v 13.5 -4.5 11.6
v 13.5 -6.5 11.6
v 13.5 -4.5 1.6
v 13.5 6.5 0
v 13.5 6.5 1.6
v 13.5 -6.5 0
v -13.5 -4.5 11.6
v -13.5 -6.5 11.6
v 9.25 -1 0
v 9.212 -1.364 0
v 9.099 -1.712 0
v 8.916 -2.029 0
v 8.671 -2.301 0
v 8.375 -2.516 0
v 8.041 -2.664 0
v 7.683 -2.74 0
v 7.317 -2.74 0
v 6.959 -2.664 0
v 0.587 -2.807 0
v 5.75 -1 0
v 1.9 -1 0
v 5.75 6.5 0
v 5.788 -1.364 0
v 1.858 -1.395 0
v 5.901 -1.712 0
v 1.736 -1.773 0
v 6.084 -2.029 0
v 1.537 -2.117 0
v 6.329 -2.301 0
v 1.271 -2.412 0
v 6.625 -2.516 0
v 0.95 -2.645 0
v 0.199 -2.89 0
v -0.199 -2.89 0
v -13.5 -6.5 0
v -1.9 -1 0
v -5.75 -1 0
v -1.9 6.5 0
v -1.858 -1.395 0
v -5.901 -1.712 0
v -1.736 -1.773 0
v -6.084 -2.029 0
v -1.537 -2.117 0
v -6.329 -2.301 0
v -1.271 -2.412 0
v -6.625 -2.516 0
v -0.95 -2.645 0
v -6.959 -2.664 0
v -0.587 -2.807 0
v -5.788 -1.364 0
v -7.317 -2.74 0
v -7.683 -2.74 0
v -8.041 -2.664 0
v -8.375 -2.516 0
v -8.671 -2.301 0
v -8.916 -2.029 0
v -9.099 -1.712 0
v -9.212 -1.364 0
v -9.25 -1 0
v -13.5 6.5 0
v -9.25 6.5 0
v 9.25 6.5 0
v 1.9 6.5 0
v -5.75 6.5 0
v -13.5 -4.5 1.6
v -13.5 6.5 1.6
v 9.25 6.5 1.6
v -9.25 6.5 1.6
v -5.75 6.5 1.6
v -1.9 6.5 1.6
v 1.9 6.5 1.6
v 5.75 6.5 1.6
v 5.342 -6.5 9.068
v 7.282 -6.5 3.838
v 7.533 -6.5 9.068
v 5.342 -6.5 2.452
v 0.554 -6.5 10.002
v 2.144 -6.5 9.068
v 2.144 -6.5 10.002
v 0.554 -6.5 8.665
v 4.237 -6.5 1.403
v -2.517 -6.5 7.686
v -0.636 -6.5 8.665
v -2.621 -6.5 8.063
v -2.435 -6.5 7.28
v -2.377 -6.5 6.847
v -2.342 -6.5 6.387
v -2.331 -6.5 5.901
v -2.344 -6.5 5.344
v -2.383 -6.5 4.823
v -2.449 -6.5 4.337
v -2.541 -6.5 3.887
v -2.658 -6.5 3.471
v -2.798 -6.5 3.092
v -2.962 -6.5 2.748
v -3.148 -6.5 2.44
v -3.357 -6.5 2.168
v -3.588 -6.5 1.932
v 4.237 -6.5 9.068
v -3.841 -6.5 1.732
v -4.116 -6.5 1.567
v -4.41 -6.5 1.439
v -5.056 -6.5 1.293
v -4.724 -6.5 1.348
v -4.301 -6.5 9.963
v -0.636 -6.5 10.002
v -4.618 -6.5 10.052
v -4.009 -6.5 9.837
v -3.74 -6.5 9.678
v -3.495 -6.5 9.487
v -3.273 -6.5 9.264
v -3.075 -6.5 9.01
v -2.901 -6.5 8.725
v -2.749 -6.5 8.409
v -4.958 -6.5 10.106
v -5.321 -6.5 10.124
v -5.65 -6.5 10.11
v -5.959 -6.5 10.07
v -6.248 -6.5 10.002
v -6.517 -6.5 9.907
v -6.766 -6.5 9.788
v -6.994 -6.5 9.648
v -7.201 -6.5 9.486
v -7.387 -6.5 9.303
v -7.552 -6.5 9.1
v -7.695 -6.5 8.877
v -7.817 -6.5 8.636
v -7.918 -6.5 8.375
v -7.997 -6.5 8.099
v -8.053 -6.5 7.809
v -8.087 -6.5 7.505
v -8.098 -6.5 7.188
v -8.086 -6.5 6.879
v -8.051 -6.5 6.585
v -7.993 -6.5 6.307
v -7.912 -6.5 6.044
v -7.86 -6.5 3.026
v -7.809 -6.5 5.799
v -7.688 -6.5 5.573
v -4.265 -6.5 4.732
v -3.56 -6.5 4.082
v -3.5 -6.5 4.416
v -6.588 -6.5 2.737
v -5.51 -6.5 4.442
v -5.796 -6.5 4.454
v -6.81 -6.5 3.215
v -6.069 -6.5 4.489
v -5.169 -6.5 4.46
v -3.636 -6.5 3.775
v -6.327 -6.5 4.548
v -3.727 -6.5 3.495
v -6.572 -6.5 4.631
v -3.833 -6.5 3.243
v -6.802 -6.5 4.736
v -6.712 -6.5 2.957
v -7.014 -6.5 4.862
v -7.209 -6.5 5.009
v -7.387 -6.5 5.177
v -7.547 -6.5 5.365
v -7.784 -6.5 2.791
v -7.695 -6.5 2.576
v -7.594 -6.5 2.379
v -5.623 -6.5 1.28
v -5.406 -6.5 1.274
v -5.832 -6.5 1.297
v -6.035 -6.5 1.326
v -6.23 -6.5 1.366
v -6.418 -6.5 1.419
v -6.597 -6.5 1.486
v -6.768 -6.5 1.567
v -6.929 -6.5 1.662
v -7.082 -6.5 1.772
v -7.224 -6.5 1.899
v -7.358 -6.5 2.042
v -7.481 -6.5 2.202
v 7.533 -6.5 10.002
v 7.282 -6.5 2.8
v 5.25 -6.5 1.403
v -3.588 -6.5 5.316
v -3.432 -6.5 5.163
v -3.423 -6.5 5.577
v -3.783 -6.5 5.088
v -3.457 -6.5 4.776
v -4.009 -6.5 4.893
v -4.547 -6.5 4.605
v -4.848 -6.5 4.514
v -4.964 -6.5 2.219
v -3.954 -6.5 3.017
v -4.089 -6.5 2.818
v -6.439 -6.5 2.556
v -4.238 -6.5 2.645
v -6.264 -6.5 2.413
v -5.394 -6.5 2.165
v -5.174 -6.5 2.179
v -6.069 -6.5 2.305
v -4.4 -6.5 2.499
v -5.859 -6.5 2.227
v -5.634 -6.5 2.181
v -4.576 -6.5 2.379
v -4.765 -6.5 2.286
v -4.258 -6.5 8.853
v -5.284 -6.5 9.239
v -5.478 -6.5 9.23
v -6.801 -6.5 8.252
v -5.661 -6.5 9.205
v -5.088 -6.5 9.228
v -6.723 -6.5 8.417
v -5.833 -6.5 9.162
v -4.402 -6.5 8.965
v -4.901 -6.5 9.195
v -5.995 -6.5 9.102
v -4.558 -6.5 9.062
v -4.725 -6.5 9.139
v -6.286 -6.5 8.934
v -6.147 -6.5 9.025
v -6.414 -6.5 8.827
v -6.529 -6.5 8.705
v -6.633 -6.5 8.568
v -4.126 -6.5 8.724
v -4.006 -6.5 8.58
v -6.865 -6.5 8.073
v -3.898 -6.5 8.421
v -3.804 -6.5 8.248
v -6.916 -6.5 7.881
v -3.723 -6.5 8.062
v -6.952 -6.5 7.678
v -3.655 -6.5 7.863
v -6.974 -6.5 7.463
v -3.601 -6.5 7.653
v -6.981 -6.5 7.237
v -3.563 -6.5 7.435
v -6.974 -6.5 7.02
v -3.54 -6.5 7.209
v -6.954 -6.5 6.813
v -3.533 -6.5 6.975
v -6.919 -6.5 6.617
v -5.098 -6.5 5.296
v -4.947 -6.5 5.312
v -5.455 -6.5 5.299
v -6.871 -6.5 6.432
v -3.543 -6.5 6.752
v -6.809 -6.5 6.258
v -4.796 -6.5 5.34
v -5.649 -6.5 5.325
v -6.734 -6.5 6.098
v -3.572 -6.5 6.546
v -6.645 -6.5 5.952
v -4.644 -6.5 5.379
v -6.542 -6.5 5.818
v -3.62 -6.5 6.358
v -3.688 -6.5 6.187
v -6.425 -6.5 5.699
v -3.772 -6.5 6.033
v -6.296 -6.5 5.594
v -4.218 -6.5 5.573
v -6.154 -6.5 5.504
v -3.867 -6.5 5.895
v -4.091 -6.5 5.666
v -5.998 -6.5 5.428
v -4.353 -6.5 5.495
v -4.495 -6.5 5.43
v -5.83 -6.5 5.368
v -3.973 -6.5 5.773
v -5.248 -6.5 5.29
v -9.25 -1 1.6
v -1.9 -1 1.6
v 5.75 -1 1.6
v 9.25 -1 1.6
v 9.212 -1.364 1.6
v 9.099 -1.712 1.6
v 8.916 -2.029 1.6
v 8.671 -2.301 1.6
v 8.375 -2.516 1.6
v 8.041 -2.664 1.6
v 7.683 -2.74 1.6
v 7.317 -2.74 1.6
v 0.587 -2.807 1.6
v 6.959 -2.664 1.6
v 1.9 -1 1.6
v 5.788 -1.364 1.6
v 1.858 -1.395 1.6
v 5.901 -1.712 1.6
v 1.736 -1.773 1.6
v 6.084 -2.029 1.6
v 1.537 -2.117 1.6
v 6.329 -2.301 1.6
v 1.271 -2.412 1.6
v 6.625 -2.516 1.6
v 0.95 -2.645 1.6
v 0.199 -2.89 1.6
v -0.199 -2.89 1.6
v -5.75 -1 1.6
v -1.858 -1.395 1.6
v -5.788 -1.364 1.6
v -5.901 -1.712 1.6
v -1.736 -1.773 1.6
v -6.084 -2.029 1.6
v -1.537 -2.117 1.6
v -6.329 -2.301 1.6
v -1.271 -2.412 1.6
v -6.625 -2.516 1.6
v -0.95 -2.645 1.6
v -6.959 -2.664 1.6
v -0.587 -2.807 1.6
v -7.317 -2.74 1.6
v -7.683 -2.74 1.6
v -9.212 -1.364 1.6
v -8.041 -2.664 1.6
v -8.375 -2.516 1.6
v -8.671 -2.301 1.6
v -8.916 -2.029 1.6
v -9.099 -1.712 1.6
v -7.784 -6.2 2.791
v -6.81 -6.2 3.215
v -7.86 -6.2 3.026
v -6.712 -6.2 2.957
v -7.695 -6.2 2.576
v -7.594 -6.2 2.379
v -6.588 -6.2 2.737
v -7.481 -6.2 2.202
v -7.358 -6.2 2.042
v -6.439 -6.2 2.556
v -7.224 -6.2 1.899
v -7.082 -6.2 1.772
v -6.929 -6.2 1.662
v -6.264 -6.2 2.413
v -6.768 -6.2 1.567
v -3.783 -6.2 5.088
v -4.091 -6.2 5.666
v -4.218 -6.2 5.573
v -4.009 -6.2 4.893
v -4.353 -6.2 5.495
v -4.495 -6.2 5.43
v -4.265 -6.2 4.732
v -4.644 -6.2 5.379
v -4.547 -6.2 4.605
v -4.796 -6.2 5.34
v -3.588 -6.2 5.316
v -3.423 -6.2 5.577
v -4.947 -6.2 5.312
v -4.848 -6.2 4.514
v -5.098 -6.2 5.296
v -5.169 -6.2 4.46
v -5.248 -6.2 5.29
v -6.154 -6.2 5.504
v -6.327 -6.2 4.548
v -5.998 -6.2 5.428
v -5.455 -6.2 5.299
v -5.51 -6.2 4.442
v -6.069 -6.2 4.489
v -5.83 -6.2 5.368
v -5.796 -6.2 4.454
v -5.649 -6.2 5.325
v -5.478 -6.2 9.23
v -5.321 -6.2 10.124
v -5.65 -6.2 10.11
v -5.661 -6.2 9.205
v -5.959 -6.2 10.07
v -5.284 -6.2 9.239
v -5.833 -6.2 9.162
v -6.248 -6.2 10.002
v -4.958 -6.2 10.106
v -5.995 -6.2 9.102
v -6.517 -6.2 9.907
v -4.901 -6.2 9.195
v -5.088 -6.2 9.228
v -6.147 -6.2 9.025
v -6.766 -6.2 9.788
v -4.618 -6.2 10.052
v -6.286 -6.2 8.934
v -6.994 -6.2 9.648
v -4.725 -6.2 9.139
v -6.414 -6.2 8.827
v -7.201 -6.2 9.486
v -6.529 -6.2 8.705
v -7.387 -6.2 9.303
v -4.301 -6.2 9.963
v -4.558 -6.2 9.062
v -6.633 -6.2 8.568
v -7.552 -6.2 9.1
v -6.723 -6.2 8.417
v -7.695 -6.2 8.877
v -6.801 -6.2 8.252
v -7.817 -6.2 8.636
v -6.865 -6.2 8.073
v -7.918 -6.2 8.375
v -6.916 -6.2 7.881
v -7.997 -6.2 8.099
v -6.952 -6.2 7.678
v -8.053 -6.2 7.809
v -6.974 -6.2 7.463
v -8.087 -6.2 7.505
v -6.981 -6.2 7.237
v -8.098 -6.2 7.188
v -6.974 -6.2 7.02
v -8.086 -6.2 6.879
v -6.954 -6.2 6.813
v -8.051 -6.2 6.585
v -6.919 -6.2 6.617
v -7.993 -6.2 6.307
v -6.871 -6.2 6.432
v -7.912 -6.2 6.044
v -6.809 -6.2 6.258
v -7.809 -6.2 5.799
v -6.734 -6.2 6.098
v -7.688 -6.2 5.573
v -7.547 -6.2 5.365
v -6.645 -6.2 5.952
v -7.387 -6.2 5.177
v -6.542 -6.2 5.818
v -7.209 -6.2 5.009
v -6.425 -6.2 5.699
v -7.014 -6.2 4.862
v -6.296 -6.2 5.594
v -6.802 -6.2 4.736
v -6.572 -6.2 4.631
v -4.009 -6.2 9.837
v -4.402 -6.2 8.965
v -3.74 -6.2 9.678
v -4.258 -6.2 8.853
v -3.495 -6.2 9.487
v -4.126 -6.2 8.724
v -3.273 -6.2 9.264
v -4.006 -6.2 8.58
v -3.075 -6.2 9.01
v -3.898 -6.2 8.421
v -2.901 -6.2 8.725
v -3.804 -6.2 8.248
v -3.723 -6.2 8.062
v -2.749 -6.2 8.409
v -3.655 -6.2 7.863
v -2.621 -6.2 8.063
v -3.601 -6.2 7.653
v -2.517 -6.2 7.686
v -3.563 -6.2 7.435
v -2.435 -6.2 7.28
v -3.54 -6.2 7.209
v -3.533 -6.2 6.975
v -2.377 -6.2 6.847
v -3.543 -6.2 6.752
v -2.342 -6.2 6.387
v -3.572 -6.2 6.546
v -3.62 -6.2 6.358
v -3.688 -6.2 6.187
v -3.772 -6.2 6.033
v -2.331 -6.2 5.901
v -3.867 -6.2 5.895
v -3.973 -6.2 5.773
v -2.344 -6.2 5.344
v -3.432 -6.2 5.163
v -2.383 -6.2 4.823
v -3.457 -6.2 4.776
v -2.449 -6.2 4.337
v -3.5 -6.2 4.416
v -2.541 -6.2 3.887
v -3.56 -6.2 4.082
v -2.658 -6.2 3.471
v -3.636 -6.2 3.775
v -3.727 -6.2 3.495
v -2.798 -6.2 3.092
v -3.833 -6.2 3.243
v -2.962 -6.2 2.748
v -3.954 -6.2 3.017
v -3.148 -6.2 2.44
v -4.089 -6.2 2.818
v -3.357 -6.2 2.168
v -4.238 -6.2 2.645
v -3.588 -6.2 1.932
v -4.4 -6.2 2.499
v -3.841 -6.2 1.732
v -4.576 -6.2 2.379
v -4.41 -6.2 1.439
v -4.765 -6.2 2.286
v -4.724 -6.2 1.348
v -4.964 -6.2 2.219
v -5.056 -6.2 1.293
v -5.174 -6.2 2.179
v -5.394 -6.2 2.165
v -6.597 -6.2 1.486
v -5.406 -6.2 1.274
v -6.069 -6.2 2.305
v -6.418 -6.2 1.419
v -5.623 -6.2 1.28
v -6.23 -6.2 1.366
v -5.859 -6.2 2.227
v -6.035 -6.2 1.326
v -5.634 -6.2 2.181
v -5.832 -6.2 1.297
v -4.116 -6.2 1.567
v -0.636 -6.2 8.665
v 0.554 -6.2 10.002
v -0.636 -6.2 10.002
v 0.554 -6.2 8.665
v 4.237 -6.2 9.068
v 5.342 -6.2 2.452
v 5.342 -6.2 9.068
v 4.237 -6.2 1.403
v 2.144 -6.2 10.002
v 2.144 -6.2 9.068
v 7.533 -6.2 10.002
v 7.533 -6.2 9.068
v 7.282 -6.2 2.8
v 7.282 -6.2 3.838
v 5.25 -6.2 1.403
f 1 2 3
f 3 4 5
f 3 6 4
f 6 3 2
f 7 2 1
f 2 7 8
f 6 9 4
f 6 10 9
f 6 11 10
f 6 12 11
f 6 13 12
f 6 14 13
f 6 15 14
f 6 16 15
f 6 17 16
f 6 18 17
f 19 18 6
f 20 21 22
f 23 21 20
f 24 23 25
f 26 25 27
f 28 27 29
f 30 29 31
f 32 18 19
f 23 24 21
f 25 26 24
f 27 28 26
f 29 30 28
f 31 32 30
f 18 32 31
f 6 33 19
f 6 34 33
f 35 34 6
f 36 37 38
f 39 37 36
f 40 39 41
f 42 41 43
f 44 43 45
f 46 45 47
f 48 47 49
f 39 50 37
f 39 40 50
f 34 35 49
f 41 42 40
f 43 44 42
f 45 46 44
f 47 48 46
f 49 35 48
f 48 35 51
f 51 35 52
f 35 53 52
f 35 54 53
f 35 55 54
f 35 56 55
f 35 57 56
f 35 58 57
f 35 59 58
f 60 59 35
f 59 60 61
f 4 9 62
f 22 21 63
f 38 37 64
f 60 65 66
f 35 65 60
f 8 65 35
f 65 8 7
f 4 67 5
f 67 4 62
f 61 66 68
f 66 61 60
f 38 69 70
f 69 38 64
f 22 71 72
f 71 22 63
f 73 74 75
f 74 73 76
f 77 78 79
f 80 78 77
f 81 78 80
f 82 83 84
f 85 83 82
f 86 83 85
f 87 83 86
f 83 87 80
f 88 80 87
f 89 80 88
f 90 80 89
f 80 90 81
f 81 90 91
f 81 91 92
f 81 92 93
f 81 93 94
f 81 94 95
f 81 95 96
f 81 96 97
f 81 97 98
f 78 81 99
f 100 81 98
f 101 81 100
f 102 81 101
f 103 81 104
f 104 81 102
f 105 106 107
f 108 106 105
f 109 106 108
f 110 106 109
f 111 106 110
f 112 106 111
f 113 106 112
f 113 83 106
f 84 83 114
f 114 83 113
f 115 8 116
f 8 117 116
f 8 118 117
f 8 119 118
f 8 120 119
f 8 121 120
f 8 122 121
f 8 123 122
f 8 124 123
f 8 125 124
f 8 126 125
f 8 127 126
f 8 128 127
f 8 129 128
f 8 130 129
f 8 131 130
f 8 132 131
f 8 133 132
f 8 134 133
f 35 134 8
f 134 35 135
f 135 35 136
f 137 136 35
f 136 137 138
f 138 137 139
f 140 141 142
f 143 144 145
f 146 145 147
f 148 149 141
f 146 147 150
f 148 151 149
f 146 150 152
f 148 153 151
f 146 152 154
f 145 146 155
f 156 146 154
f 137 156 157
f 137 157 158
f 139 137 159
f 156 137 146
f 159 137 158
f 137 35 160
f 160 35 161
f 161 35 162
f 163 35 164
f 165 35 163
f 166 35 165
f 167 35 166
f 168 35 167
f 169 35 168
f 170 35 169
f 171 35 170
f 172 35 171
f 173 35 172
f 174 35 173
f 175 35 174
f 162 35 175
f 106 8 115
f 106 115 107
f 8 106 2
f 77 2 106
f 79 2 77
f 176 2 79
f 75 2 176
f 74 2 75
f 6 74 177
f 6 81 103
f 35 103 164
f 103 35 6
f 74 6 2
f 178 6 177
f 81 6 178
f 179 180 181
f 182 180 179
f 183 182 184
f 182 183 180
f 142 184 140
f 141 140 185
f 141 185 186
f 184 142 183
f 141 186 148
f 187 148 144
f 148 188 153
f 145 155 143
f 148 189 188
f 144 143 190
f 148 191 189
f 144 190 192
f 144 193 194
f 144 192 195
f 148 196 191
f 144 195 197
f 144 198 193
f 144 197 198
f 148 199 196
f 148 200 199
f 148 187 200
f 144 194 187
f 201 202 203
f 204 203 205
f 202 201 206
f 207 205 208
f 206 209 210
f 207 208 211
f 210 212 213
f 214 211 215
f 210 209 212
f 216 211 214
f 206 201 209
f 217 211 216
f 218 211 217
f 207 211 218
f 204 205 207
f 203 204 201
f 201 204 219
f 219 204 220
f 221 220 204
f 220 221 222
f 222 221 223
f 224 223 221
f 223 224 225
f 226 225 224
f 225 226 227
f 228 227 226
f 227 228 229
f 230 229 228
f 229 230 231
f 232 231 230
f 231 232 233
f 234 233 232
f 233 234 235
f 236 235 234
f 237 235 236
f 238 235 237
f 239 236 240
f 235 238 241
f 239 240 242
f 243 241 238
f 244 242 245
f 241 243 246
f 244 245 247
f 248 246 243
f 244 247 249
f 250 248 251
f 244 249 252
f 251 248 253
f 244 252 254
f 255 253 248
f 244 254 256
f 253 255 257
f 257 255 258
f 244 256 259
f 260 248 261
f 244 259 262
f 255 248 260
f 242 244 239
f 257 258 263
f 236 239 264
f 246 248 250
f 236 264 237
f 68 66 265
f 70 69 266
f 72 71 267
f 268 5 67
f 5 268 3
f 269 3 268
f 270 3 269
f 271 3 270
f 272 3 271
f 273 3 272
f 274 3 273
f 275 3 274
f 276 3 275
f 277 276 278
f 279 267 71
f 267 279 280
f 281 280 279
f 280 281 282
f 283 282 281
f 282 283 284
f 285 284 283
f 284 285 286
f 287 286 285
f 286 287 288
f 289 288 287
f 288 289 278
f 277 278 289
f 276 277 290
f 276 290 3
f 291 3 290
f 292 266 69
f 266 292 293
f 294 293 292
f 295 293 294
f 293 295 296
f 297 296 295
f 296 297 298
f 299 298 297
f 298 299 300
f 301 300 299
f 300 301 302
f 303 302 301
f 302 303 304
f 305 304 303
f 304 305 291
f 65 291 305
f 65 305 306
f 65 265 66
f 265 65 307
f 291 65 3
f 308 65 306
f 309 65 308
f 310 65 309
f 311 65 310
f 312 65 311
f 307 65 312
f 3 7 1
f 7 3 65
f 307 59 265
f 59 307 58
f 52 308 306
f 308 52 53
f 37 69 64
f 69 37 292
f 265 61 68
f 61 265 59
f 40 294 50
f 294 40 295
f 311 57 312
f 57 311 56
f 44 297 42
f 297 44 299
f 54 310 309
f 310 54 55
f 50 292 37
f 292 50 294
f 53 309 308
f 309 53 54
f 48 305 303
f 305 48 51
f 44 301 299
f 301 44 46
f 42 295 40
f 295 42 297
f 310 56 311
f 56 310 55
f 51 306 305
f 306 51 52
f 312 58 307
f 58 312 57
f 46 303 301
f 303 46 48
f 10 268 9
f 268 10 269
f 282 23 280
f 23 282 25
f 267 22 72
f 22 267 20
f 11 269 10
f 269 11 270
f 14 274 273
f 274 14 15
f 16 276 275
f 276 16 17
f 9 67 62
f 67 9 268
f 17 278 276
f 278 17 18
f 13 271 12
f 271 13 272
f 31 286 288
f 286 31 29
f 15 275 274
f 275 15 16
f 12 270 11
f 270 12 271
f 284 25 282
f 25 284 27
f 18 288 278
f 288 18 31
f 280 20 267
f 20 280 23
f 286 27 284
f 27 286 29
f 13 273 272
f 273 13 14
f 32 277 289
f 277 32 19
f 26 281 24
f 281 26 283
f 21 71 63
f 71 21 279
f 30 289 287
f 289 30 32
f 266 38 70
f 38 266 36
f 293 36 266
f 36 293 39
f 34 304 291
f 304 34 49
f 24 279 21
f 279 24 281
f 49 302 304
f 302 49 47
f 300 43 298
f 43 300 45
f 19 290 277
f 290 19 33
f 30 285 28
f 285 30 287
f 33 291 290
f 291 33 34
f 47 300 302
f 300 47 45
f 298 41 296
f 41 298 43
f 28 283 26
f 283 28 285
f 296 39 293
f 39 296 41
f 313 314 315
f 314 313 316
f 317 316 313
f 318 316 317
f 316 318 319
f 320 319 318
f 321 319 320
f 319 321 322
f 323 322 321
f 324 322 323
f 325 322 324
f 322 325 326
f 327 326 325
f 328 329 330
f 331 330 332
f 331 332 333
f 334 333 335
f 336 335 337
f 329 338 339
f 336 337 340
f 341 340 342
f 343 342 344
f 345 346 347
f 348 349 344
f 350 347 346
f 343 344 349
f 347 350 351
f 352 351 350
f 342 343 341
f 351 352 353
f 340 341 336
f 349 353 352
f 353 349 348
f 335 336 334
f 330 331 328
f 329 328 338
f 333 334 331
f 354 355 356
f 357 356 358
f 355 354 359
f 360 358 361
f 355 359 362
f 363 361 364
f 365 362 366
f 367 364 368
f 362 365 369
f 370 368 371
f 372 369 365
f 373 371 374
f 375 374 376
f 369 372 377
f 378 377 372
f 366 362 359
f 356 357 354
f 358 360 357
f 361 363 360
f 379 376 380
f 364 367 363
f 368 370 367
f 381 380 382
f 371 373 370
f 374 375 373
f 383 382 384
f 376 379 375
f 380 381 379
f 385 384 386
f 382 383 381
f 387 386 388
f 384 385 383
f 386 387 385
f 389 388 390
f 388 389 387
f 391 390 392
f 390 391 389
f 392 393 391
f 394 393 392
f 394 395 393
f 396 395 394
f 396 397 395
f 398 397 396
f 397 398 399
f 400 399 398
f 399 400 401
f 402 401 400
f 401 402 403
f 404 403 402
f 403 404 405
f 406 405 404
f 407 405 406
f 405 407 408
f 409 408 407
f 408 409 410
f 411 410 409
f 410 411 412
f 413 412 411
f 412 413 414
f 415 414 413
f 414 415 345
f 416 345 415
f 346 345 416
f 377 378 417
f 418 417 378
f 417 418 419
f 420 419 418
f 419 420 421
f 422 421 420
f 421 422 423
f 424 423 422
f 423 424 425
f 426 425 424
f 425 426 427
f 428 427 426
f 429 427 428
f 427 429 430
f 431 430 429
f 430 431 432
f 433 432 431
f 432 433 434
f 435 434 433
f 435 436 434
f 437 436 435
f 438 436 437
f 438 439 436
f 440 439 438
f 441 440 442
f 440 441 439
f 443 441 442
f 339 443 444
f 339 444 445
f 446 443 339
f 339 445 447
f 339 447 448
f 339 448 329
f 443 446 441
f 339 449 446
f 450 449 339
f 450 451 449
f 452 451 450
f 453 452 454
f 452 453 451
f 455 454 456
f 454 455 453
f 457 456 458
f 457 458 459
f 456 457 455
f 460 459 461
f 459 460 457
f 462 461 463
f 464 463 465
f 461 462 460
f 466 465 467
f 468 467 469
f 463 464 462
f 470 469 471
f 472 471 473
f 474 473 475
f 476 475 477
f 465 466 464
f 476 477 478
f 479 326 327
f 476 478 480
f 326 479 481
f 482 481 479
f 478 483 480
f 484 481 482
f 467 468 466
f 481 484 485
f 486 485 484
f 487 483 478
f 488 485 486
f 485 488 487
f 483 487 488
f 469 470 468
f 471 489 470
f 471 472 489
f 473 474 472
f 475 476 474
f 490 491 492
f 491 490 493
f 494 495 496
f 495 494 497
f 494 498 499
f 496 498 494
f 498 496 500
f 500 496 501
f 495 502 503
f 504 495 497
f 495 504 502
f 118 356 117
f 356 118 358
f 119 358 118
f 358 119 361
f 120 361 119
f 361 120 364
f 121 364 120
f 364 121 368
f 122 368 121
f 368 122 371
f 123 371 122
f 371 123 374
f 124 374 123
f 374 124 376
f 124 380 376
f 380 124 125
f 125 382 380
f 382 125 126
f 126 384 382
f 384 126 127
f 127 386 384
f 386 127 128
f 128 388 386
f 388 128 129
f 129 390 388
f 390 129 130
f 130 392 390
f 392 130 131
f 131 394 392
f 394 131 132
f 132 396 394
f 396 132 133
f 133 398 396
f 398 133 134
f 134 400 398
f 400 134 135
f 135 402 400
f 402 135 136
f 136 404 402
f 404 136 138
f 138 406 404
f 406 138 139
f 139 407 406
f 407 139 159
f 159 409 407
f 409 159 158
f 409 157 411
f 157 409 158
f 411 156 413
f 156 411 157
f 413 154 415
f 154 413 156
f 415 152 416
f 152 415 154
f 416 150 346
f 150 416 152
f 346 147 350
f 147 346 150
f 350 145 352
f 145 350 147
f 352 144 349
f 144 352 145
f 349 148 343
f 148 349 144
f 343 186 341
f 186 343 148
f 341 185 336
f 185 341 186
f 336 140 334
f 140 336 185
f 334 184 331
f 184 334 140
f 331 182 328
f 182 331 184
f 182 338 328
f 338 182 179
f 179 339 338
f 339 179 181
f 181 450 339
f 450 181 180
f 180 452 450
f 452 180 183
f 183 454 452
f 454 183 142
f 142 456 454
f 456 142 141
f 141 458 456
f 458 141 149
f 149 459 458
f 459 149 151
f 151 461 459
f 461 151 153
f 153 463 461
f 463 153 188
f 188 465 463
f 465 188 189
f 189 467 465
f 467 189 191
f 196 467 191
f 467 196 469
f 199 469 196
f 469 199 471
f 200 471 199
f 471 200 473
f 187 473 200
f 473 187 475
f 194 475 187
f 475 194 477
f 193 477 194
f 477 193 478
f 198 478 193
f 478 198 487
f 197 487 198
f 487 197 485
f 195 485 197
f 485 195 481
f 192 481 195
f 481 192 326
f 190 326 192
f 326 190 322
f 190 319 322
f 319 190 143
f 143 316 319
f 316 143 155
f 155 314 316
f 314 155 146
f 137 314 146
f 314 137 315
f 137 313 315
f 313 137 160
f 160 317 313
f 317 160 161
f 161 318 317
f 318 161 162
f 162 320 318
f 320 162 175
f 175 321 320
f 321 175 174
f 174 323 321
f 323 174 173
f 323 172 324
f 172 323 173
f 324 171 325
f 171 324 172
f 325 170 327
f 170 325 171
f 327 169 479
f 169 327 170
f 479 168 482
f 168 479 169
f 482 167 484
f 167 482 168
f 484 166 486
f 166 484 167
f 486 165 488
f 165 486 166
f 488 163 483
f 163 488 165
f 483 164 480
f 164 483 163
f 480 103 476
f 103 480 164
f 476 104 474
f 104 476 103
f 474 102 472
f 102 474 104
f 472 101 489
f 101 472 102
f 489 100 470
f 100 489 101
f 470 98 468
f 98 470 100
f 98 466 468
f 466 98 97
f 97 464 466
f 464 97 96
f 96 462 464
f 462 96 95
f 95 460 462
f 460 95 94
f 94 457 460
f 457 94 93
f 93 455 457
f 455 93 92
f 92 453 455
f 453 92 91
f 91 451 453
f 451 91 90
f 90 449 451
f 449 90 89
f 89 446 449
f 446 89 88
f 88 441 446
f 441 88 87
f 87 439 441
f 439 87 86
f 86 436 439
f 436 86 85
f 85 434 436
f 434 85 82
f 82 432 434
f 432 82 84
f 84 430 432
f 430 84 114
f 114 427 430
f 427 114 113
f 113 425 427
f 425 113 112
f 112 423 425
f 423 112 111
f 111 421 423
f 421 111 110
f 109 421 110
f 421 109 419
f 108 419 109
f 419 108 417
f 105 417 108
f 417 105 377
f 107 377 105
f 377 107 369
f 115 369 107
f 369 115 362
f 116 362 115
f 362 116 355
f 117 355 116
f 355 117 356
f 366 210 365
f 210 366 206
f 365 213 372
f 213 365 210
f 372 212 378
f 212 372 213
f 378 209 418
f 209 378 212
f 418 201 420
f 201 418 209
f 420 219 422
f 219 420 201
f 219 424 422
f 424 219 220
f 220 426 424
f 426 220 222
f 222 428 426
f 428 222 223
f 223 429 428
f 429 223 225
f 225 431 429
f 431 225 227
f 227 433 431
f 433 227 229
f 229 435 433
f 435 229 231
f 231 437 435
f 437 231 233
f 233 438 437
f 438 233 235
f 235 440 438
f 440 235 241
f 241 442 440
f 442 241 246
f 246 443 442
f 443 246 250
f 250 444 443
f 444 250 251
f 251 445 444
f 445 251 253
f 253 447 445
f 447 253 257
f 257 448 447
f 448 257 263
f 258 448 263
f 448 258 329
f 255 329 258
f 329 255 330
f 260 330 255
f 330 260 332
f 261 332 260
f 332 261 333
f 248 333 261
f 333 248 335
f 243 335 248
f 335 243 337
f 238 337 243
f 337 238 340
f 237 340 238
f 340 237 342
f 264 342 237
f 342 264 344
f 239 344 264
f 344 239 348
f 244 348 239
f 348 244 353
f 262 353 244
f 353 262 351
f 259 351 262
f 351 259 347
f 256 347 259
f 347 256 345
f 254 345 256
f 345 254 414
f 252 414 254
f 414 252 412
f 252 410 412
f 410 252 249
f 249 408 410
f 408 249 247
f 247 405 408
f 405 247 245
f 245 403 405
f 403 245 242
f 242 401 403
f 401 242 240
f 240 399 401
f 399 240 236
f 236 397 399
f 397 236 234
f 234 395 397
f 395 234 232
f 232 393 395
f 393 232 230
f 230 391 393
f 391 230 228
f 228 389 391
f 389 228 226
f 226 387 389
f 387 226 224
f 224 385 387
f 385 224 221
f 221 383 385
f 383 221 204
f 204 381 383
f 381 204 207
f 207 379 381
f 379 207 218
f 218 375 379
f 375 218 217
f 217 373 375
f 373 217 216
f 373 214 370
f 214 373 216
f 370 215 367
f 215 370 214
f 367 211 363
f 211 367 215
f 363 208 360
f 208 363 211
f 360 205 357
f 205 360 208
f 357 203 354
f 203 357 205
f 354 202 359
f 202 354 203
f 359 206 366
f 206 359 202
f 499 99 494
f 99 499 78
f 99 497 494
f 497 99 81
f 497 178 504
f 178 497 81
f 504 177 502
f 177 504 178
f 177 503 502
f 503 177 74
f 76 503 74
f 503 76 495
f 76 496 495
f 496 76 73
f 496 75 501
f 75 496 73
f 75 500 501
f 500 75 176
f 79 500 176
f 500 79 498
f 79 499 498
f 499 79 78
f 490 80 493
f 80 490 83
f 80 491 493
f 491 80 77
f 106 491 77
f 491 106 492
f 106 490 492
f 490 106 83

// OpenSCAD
//adjustment_block(h=0.6);
//adjustment_block(h=0.8);
//adjustment_block(h=1.0);
//adjustment_block(h=1.2);
//adjustment_block(h=1.4);
adjustment_block(h=1.6);


module adjustment_block(h=0.4) {
    difference() {
        translate([0, 0, (10 + h)/2])
        cube([27, 13, 10 + h], center=true);

        translate([-1, 2, (10 + h)/2 + h])
        cube([30, 13, 10 + h], center=true);

        hull() {
            translate([-15/2, -1, 0])
            cylinder(d=3.5, h=100, center=true, $fn=30);

            translate([-15/2, 20, 0])
            cylinder(d=3.5, h=100, center=true, $fn=30);
        }

        hull() {
            translate([15/2, -1, 0])
            cylinder(d=3.5, h=100, center=true, $fn=30);

            translate([15/2, 20, 0])
            cylinder(d=3.5, h=100, center=true, $fn=30);
        }

        hull() {
            translate([0, -1, 0])
            cylinder(d=3.8, h=100, center=true, $fn=30);

            translate([0, 20, 0])
            cylinder(d=3.8, h=100, center=true, $fn=30);
        }

        translate([0, -13/2 + 0.3, (10 + h)/2])
        rotate([90, 180, 0])
        linear_extrude(1)
        text(text=str(h), size=9, halign="center", valign="center");
    }
}
